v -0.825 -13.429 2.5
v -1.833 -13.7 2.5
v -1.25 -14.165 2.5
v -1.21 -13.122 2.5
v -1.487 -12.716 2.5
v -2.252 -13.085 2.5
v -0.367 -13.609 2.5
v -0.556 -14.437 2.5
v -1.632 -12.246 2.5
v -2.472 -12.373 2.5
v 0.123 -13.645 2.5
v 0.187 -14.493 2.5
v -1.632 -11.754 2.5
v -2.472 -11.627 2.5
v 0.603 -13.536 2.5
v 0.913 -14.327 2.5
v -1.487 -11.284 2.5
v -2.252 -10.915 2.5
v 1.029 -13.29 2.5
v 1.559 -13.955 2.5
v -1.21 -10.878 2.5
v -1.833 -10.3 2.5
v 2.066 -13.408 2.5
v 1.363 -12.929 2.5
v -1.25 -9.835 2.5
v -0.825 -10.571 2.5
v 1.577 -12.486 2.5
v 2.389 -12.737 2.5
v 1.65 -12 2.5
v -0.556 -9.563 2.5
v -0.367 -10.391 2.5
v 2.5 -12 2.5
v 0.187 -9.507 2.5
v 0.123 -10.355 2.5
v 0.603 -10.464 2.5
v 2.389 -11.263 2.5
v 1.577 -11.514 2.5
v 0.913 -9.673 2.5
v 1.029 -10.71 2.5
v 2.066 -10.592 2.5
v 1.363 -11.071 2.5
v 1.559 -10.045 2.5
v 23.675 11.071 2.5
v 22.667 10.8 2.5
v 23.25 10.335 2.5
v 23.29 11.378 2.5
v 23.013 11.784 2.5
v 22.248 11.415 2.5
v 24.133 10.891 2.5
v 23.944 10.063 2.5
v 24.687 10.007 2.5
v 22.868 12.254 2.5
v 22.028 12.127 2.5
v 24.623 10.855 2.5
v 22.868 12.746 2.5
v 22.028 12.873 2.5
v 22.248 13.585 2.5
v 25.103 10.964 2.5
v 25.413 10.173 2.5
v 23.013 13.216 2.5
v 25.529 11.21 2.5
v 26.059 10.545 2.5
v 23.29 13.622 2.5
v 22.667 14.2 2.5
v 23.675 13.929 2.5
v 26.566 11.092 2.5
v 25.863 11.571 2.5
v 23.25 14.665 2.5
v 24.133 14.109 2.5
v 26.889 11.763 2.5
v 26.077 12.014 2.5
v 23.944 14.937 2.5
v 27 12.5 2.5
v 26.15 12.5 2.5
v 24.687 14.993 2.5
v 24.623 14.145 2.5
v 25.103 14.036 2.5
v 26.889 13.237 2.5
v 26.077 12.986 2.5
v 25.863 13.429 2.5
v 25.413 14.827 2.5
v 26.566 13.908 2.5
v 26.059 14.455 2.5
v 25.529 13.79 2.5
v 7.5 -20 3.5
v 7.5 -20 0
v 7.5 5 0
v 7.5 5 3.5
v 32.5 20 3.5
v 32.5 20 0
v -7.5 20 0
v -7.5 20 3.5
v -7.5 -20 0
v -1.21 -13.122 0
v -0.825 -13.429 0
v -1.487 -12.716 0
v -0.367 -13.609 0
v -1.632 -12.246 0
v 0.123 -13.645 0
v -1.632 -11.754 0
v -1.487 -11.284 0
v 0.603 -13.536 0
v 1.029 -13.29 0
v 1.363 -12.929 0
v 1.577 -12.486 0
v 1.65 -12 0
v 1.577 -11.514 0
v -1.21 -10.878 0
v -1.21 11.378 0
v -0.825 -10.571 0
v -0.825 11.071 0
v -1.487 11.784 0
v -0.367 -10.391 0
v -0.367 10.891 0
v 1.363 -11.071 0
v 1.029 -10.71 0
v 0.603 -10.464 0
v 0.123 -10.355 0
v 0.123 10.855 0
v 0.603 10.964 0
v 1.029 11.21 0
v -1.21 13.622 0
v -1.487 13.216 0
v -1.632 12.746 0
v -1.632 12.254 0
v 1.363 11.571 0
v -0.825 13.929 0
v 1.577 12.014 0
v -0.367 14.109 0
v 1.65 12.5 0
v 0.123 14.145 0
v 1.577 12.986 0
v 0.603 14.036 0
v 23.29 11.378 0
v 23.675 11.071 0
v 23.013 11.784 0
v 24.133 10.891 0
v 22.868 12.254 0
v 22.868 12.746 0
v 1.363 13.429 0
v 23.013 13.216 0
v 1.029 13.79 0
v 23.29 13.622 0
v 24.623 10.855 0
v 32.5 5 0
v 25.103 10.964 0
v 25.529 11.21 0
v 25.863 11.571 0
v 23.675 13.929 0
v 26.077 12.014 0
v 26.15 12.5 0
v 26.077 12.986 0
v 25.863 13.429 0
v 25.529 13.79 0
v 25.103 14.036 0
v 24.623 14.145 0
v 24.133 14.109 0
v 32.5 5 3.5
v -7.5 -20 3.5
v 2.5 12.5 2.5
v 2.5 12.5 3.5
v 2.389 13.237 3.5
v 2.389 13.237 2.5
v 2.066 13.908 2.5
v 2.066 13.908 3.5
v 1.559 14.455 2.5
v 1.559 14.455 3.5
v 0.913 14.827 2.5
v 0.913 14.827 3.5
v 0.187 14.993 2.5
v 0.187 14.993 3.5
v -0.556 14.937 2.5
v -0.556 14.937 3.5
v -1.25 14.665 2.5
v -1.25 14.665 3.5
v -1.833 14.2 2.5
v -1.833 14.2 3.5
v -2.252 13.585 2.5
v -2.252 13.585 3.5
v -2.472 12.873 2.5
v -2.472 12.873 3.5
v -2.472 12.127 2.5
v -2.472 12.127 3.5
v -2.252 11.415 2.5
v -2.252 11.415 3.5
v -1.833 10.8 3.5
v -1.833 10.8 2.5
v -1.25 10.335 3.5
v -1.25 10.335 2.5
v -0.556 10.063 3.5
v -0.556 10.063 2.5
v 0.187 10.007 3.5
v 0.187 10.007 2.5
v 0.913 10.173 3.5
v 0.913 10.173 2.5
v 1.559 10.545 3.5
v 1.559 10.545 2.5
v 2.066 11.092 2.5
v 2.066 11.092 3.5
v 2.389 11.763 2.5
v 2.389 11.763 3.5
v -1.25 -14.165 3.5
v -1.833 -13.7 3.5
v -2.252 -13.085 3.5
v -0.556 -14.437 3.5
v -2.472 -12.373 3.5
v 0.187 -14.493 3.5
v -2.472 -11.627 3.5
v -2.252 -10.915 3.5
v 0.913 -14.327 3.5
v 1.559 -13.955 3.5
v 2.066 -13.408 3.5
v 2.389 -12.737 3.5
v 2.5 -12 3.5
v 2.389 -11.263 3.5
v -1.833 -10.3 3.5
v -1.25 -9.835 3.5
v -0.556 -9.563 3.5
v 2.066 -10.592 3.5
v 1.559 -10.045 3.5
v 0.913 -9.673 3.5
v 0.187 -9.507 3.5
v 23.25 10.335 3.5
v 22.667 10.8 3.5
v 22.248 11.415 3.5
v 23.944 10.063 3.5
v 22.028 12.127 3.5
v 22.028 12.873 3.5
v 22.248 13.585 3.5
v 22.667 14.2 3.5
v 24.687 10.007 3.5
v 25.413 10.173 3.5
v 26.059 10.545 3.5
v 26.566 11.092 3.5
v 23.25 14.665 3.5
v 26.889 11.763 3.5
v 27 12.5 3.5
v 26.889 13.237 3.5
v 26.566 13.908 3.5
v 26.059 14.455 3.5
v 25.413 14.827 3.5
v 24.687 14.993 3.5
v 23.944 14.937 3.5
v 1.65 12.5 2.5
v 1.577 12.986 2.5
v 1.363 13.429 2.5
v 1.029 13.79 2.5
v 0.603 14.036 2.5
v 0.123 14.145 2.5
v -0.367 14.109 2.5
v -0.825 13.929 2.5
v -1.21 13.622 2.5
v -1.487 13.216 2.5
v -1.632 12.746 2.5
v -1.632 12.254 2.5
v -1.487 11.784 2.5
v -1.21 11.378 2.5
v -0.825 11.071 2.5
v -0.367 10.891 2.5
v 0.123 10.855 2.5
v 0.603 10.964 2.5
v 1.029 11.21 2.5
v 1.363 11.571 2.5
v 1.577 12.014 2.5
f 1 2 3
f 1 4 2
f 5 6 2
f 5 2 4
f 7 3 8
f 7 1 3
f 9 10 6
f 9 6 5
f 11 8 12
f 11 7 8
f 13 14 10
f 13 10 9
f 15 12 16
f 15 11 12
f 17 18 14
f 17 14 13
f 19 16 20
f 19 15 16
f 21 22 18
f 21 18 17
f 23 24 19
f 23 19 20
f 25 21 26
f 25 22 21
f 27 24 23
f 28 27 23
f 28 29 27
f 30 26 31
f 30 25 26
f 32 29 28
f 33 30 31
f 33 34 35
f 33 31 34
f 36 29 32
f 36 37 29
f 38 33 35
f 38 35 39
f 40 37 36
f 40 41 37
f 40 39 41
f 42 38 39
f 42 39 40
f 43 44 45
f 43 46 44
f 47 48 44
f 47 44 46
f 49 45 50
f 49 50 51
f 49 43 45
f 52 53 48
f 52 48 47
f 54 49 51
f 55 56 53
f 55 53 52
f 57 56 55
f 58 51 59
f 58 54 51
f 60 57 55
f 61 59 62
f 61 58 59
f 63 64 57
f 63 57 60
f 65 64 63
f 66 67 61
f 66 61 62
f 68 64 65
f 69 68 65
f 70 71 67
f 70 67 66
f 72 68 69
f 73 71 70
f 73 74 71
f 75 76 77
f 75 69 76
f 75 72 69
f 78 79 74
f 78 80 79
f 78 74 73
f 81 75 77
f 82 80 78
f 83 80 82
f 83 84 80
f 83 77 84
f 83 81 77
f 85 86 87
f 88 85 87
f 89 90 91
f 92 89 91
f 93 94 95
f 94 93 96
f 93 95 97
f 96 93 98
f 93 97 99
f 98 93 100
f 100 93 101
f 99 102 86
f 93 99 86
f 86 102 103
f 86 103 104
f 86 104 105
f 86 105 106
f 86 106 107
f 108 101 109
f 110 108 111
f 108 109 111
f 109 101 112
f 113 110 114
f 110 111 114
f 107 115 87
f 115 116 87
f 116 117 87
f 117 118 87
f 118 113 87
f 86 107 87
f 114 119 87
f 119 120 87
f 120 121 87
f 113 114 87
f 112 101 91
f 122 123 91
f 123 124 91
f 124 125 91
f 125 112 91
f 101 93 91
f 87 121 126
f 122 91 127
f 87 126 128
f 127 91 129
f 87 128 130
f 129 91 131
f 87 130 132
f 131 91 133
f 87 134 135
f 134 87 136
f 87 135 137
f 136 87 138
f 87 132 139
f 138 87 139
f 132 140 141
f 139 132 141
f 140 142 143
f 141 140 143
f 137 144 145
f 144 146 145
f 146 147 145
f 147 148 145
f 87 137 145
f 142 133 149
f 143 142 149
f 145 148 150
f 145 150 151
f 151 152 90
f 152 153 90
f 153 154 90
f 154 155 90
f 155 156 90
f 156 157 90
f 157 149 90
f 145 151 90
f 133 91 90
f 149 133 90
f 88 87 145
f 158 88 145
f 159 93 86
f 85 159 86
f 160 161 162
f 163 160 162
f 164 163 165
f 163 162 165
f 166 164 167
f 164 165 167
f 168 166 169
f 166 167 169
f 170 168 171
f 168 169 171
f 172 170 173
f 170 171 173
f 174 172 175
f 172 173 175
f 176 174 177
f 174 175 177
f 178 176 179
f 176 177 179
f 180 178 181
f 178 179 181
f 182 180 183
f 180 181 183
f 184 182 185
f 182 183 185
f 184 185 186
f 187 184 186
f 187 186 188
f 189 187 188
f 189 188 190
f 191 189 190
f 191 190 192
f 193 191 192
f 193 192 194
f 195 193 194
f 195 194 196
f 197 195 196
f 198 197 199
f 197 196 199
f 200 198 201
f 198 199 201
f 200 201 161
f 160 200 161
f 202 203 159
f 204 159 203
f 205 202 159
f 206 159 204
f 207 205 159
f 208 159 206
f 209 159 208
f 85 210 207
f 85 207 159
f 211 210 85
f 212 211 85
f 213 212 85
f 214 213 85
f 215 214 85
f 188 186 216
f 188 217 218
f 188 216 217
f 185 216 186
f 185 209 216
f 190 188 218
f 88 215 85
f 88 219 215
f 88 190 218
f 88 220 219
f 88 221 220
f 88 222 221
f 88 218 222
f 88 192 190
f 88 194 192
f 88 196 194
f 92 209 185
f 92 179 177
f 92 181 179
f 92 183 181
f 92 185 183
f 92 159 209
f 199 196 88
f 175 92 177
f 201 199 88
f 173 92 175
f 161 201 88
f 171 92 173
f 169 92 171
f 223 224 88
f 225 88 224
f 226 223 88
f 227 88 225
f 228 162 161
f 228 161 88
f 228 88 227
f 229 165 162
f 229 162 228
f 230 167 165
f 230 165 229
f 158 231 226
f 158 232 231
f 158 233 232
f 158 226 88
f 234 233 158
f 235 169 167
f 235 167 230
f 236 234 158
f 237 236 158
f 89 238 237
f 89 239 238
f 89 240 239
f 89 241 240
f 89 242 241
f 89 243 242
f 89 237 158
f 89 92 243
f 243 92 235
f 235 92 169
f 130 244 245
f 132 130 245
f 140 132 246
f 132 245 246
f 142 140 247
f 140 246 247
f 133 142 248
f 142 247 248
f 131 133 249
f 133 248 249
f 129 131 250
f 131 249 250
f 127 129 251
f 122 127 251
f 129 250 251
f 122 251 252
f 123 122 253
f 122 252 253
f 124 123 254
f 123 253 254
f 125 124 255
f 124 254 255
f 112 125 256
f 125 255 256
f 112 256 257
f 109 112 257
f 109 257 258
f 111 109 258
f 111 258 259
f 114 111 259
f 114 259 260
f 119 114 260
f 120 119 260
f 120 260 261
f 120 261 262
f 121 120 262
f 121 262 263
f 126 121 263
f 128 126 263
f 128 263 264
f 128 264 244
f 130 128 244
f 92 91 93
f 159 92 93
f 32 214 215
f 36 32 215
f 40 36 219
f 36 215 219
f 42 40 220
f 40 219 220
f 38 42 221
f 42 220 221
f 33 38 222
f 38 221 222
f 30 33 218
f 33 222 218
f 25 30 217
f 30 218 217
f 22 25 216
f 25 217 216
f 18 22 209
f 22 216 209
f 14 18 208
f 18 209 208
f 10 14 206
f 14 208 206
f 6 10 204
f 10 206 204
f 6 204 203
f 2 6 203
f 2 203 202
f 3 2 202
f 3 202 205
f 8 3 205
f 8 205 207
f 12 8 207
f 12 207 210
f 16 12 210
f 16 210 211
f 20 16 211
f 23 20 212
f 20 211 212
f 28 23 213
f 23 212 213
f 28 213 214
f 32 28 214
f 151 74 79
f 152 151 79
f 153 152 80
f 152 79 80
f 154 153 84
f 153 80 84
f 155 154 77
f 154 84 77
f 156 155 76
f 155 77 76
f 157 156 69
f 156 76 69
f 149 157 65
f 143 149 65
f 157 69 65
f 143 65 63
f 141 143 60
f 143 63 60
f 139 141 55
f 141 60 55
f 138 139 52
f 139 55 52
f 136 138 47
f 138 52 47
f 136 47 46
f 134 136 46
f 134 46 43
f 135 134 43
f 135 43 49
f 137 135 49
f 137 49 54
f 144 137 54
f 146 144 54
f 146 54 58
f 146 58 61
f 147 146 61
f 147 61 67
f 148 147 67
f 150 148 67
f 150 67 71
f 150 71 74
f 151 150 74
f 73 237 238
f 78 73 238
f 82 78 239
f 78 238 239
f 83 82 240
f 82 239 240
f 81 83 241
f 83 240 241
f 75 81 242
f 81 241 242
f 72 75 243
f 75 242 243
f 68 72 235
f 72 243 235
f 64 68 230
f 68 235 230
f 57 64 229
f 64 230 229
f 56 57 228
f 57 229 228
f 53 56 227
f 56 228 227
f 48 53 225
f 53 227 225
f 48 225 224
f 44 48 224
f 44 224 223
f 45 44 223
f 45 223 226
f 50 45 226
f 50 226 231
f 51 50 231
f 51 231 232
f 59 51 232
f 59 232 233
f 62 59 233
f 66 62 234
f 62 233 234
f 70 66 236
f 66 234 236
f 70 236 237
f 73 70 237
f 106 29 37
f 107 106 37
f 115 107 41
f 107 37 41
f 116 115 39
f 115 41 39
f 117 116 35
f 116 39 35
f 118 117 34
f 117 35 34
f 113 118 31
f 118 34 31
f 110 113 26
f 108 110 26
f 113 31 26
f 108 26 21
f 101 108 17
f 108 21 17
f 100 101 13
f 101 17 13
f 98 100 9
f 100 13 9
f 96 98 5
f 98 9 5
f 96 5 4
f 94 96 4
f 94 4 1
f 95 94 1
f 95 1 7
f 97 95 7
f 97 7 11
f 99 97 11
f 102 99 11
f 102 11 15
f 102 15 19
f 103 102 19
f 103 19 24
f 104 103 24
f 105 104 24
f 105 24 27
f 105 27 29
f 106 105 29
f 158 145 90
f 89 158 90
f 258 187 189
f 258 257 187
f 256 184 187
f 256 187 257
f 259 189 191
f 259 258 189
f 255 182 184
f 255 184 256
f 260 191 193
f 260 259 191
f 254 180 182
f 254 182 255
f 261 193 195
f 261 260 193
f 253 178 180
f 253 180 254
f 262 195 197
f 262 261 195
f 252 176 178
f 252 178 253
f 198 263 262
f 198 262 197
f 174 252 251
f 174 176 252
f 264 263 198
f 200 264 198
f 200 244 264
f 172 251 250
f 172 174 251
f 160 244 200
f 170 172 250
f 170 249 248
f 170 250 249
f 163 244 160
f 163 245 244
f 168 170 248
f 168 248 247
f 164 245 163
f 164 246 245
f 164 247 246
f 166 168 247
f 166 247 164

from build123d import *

# Parameters (mm, degrees)
F0_W     = 25
F0_H     = 15
F1_DEPTH = 3.5
F2_R     = 1.65
F3_DEPTH = 3.5
F2_R_2   = 2.5
F4_DEPTH = 1


with BuildPart() as f1:
    # F0 (on Top) → F1 (new body)
    with BuildSketch(Plane.XY):
        Polygon((7.5, 20), (-7.5, 20), (-7.5, -20), (7.5, -20), (7.5, 5), align=None)
        with Locations((20, 12.5)):
            Rectangle(F0_W, F0_H)
    extrude(amount=F1_DEPTH)

    # F2 (on face) → F3 (cut, through all)
    with BuildSketch(Plane.XY.offset(3.5)):
        with Locations((0, 12.5)):
            Circle(F2_R)
        with Locations((0, -12)):
            Circle(F2_R)
        with Locations((24.5, 12.5)):
            Circle(F2_R)
    extrude(amount=-F3_DEPTH, mode=Mode.SUBTRACT)

    # F2 (on face) → F4 (cut)
    with BuildSketch(Plane.XY.offset(3.5)):
        with Locations((0, -12)):
            Circle(F2_R_2)
        with Locations((0, -12)):
            Circle(F2_R, mode=Mode.SUBTRACT)
        with Locations((0, 12.5)):
            Circle(F2_R_2)
        with Locations((0, 12.5)):
            Circle(F2_R, mode=Mode.SUBTRACT)
        with Locations((24.5, 12.5)):
            Circle(F2_R_2)
        with Locations((24.5, 12.5)):
            Circle(F2_R, mode=Mode.SUBTRACT)
    extrude(amount=-F4_DEPTH, mode=Mode.SUBTRACT)


solid = f1.part
